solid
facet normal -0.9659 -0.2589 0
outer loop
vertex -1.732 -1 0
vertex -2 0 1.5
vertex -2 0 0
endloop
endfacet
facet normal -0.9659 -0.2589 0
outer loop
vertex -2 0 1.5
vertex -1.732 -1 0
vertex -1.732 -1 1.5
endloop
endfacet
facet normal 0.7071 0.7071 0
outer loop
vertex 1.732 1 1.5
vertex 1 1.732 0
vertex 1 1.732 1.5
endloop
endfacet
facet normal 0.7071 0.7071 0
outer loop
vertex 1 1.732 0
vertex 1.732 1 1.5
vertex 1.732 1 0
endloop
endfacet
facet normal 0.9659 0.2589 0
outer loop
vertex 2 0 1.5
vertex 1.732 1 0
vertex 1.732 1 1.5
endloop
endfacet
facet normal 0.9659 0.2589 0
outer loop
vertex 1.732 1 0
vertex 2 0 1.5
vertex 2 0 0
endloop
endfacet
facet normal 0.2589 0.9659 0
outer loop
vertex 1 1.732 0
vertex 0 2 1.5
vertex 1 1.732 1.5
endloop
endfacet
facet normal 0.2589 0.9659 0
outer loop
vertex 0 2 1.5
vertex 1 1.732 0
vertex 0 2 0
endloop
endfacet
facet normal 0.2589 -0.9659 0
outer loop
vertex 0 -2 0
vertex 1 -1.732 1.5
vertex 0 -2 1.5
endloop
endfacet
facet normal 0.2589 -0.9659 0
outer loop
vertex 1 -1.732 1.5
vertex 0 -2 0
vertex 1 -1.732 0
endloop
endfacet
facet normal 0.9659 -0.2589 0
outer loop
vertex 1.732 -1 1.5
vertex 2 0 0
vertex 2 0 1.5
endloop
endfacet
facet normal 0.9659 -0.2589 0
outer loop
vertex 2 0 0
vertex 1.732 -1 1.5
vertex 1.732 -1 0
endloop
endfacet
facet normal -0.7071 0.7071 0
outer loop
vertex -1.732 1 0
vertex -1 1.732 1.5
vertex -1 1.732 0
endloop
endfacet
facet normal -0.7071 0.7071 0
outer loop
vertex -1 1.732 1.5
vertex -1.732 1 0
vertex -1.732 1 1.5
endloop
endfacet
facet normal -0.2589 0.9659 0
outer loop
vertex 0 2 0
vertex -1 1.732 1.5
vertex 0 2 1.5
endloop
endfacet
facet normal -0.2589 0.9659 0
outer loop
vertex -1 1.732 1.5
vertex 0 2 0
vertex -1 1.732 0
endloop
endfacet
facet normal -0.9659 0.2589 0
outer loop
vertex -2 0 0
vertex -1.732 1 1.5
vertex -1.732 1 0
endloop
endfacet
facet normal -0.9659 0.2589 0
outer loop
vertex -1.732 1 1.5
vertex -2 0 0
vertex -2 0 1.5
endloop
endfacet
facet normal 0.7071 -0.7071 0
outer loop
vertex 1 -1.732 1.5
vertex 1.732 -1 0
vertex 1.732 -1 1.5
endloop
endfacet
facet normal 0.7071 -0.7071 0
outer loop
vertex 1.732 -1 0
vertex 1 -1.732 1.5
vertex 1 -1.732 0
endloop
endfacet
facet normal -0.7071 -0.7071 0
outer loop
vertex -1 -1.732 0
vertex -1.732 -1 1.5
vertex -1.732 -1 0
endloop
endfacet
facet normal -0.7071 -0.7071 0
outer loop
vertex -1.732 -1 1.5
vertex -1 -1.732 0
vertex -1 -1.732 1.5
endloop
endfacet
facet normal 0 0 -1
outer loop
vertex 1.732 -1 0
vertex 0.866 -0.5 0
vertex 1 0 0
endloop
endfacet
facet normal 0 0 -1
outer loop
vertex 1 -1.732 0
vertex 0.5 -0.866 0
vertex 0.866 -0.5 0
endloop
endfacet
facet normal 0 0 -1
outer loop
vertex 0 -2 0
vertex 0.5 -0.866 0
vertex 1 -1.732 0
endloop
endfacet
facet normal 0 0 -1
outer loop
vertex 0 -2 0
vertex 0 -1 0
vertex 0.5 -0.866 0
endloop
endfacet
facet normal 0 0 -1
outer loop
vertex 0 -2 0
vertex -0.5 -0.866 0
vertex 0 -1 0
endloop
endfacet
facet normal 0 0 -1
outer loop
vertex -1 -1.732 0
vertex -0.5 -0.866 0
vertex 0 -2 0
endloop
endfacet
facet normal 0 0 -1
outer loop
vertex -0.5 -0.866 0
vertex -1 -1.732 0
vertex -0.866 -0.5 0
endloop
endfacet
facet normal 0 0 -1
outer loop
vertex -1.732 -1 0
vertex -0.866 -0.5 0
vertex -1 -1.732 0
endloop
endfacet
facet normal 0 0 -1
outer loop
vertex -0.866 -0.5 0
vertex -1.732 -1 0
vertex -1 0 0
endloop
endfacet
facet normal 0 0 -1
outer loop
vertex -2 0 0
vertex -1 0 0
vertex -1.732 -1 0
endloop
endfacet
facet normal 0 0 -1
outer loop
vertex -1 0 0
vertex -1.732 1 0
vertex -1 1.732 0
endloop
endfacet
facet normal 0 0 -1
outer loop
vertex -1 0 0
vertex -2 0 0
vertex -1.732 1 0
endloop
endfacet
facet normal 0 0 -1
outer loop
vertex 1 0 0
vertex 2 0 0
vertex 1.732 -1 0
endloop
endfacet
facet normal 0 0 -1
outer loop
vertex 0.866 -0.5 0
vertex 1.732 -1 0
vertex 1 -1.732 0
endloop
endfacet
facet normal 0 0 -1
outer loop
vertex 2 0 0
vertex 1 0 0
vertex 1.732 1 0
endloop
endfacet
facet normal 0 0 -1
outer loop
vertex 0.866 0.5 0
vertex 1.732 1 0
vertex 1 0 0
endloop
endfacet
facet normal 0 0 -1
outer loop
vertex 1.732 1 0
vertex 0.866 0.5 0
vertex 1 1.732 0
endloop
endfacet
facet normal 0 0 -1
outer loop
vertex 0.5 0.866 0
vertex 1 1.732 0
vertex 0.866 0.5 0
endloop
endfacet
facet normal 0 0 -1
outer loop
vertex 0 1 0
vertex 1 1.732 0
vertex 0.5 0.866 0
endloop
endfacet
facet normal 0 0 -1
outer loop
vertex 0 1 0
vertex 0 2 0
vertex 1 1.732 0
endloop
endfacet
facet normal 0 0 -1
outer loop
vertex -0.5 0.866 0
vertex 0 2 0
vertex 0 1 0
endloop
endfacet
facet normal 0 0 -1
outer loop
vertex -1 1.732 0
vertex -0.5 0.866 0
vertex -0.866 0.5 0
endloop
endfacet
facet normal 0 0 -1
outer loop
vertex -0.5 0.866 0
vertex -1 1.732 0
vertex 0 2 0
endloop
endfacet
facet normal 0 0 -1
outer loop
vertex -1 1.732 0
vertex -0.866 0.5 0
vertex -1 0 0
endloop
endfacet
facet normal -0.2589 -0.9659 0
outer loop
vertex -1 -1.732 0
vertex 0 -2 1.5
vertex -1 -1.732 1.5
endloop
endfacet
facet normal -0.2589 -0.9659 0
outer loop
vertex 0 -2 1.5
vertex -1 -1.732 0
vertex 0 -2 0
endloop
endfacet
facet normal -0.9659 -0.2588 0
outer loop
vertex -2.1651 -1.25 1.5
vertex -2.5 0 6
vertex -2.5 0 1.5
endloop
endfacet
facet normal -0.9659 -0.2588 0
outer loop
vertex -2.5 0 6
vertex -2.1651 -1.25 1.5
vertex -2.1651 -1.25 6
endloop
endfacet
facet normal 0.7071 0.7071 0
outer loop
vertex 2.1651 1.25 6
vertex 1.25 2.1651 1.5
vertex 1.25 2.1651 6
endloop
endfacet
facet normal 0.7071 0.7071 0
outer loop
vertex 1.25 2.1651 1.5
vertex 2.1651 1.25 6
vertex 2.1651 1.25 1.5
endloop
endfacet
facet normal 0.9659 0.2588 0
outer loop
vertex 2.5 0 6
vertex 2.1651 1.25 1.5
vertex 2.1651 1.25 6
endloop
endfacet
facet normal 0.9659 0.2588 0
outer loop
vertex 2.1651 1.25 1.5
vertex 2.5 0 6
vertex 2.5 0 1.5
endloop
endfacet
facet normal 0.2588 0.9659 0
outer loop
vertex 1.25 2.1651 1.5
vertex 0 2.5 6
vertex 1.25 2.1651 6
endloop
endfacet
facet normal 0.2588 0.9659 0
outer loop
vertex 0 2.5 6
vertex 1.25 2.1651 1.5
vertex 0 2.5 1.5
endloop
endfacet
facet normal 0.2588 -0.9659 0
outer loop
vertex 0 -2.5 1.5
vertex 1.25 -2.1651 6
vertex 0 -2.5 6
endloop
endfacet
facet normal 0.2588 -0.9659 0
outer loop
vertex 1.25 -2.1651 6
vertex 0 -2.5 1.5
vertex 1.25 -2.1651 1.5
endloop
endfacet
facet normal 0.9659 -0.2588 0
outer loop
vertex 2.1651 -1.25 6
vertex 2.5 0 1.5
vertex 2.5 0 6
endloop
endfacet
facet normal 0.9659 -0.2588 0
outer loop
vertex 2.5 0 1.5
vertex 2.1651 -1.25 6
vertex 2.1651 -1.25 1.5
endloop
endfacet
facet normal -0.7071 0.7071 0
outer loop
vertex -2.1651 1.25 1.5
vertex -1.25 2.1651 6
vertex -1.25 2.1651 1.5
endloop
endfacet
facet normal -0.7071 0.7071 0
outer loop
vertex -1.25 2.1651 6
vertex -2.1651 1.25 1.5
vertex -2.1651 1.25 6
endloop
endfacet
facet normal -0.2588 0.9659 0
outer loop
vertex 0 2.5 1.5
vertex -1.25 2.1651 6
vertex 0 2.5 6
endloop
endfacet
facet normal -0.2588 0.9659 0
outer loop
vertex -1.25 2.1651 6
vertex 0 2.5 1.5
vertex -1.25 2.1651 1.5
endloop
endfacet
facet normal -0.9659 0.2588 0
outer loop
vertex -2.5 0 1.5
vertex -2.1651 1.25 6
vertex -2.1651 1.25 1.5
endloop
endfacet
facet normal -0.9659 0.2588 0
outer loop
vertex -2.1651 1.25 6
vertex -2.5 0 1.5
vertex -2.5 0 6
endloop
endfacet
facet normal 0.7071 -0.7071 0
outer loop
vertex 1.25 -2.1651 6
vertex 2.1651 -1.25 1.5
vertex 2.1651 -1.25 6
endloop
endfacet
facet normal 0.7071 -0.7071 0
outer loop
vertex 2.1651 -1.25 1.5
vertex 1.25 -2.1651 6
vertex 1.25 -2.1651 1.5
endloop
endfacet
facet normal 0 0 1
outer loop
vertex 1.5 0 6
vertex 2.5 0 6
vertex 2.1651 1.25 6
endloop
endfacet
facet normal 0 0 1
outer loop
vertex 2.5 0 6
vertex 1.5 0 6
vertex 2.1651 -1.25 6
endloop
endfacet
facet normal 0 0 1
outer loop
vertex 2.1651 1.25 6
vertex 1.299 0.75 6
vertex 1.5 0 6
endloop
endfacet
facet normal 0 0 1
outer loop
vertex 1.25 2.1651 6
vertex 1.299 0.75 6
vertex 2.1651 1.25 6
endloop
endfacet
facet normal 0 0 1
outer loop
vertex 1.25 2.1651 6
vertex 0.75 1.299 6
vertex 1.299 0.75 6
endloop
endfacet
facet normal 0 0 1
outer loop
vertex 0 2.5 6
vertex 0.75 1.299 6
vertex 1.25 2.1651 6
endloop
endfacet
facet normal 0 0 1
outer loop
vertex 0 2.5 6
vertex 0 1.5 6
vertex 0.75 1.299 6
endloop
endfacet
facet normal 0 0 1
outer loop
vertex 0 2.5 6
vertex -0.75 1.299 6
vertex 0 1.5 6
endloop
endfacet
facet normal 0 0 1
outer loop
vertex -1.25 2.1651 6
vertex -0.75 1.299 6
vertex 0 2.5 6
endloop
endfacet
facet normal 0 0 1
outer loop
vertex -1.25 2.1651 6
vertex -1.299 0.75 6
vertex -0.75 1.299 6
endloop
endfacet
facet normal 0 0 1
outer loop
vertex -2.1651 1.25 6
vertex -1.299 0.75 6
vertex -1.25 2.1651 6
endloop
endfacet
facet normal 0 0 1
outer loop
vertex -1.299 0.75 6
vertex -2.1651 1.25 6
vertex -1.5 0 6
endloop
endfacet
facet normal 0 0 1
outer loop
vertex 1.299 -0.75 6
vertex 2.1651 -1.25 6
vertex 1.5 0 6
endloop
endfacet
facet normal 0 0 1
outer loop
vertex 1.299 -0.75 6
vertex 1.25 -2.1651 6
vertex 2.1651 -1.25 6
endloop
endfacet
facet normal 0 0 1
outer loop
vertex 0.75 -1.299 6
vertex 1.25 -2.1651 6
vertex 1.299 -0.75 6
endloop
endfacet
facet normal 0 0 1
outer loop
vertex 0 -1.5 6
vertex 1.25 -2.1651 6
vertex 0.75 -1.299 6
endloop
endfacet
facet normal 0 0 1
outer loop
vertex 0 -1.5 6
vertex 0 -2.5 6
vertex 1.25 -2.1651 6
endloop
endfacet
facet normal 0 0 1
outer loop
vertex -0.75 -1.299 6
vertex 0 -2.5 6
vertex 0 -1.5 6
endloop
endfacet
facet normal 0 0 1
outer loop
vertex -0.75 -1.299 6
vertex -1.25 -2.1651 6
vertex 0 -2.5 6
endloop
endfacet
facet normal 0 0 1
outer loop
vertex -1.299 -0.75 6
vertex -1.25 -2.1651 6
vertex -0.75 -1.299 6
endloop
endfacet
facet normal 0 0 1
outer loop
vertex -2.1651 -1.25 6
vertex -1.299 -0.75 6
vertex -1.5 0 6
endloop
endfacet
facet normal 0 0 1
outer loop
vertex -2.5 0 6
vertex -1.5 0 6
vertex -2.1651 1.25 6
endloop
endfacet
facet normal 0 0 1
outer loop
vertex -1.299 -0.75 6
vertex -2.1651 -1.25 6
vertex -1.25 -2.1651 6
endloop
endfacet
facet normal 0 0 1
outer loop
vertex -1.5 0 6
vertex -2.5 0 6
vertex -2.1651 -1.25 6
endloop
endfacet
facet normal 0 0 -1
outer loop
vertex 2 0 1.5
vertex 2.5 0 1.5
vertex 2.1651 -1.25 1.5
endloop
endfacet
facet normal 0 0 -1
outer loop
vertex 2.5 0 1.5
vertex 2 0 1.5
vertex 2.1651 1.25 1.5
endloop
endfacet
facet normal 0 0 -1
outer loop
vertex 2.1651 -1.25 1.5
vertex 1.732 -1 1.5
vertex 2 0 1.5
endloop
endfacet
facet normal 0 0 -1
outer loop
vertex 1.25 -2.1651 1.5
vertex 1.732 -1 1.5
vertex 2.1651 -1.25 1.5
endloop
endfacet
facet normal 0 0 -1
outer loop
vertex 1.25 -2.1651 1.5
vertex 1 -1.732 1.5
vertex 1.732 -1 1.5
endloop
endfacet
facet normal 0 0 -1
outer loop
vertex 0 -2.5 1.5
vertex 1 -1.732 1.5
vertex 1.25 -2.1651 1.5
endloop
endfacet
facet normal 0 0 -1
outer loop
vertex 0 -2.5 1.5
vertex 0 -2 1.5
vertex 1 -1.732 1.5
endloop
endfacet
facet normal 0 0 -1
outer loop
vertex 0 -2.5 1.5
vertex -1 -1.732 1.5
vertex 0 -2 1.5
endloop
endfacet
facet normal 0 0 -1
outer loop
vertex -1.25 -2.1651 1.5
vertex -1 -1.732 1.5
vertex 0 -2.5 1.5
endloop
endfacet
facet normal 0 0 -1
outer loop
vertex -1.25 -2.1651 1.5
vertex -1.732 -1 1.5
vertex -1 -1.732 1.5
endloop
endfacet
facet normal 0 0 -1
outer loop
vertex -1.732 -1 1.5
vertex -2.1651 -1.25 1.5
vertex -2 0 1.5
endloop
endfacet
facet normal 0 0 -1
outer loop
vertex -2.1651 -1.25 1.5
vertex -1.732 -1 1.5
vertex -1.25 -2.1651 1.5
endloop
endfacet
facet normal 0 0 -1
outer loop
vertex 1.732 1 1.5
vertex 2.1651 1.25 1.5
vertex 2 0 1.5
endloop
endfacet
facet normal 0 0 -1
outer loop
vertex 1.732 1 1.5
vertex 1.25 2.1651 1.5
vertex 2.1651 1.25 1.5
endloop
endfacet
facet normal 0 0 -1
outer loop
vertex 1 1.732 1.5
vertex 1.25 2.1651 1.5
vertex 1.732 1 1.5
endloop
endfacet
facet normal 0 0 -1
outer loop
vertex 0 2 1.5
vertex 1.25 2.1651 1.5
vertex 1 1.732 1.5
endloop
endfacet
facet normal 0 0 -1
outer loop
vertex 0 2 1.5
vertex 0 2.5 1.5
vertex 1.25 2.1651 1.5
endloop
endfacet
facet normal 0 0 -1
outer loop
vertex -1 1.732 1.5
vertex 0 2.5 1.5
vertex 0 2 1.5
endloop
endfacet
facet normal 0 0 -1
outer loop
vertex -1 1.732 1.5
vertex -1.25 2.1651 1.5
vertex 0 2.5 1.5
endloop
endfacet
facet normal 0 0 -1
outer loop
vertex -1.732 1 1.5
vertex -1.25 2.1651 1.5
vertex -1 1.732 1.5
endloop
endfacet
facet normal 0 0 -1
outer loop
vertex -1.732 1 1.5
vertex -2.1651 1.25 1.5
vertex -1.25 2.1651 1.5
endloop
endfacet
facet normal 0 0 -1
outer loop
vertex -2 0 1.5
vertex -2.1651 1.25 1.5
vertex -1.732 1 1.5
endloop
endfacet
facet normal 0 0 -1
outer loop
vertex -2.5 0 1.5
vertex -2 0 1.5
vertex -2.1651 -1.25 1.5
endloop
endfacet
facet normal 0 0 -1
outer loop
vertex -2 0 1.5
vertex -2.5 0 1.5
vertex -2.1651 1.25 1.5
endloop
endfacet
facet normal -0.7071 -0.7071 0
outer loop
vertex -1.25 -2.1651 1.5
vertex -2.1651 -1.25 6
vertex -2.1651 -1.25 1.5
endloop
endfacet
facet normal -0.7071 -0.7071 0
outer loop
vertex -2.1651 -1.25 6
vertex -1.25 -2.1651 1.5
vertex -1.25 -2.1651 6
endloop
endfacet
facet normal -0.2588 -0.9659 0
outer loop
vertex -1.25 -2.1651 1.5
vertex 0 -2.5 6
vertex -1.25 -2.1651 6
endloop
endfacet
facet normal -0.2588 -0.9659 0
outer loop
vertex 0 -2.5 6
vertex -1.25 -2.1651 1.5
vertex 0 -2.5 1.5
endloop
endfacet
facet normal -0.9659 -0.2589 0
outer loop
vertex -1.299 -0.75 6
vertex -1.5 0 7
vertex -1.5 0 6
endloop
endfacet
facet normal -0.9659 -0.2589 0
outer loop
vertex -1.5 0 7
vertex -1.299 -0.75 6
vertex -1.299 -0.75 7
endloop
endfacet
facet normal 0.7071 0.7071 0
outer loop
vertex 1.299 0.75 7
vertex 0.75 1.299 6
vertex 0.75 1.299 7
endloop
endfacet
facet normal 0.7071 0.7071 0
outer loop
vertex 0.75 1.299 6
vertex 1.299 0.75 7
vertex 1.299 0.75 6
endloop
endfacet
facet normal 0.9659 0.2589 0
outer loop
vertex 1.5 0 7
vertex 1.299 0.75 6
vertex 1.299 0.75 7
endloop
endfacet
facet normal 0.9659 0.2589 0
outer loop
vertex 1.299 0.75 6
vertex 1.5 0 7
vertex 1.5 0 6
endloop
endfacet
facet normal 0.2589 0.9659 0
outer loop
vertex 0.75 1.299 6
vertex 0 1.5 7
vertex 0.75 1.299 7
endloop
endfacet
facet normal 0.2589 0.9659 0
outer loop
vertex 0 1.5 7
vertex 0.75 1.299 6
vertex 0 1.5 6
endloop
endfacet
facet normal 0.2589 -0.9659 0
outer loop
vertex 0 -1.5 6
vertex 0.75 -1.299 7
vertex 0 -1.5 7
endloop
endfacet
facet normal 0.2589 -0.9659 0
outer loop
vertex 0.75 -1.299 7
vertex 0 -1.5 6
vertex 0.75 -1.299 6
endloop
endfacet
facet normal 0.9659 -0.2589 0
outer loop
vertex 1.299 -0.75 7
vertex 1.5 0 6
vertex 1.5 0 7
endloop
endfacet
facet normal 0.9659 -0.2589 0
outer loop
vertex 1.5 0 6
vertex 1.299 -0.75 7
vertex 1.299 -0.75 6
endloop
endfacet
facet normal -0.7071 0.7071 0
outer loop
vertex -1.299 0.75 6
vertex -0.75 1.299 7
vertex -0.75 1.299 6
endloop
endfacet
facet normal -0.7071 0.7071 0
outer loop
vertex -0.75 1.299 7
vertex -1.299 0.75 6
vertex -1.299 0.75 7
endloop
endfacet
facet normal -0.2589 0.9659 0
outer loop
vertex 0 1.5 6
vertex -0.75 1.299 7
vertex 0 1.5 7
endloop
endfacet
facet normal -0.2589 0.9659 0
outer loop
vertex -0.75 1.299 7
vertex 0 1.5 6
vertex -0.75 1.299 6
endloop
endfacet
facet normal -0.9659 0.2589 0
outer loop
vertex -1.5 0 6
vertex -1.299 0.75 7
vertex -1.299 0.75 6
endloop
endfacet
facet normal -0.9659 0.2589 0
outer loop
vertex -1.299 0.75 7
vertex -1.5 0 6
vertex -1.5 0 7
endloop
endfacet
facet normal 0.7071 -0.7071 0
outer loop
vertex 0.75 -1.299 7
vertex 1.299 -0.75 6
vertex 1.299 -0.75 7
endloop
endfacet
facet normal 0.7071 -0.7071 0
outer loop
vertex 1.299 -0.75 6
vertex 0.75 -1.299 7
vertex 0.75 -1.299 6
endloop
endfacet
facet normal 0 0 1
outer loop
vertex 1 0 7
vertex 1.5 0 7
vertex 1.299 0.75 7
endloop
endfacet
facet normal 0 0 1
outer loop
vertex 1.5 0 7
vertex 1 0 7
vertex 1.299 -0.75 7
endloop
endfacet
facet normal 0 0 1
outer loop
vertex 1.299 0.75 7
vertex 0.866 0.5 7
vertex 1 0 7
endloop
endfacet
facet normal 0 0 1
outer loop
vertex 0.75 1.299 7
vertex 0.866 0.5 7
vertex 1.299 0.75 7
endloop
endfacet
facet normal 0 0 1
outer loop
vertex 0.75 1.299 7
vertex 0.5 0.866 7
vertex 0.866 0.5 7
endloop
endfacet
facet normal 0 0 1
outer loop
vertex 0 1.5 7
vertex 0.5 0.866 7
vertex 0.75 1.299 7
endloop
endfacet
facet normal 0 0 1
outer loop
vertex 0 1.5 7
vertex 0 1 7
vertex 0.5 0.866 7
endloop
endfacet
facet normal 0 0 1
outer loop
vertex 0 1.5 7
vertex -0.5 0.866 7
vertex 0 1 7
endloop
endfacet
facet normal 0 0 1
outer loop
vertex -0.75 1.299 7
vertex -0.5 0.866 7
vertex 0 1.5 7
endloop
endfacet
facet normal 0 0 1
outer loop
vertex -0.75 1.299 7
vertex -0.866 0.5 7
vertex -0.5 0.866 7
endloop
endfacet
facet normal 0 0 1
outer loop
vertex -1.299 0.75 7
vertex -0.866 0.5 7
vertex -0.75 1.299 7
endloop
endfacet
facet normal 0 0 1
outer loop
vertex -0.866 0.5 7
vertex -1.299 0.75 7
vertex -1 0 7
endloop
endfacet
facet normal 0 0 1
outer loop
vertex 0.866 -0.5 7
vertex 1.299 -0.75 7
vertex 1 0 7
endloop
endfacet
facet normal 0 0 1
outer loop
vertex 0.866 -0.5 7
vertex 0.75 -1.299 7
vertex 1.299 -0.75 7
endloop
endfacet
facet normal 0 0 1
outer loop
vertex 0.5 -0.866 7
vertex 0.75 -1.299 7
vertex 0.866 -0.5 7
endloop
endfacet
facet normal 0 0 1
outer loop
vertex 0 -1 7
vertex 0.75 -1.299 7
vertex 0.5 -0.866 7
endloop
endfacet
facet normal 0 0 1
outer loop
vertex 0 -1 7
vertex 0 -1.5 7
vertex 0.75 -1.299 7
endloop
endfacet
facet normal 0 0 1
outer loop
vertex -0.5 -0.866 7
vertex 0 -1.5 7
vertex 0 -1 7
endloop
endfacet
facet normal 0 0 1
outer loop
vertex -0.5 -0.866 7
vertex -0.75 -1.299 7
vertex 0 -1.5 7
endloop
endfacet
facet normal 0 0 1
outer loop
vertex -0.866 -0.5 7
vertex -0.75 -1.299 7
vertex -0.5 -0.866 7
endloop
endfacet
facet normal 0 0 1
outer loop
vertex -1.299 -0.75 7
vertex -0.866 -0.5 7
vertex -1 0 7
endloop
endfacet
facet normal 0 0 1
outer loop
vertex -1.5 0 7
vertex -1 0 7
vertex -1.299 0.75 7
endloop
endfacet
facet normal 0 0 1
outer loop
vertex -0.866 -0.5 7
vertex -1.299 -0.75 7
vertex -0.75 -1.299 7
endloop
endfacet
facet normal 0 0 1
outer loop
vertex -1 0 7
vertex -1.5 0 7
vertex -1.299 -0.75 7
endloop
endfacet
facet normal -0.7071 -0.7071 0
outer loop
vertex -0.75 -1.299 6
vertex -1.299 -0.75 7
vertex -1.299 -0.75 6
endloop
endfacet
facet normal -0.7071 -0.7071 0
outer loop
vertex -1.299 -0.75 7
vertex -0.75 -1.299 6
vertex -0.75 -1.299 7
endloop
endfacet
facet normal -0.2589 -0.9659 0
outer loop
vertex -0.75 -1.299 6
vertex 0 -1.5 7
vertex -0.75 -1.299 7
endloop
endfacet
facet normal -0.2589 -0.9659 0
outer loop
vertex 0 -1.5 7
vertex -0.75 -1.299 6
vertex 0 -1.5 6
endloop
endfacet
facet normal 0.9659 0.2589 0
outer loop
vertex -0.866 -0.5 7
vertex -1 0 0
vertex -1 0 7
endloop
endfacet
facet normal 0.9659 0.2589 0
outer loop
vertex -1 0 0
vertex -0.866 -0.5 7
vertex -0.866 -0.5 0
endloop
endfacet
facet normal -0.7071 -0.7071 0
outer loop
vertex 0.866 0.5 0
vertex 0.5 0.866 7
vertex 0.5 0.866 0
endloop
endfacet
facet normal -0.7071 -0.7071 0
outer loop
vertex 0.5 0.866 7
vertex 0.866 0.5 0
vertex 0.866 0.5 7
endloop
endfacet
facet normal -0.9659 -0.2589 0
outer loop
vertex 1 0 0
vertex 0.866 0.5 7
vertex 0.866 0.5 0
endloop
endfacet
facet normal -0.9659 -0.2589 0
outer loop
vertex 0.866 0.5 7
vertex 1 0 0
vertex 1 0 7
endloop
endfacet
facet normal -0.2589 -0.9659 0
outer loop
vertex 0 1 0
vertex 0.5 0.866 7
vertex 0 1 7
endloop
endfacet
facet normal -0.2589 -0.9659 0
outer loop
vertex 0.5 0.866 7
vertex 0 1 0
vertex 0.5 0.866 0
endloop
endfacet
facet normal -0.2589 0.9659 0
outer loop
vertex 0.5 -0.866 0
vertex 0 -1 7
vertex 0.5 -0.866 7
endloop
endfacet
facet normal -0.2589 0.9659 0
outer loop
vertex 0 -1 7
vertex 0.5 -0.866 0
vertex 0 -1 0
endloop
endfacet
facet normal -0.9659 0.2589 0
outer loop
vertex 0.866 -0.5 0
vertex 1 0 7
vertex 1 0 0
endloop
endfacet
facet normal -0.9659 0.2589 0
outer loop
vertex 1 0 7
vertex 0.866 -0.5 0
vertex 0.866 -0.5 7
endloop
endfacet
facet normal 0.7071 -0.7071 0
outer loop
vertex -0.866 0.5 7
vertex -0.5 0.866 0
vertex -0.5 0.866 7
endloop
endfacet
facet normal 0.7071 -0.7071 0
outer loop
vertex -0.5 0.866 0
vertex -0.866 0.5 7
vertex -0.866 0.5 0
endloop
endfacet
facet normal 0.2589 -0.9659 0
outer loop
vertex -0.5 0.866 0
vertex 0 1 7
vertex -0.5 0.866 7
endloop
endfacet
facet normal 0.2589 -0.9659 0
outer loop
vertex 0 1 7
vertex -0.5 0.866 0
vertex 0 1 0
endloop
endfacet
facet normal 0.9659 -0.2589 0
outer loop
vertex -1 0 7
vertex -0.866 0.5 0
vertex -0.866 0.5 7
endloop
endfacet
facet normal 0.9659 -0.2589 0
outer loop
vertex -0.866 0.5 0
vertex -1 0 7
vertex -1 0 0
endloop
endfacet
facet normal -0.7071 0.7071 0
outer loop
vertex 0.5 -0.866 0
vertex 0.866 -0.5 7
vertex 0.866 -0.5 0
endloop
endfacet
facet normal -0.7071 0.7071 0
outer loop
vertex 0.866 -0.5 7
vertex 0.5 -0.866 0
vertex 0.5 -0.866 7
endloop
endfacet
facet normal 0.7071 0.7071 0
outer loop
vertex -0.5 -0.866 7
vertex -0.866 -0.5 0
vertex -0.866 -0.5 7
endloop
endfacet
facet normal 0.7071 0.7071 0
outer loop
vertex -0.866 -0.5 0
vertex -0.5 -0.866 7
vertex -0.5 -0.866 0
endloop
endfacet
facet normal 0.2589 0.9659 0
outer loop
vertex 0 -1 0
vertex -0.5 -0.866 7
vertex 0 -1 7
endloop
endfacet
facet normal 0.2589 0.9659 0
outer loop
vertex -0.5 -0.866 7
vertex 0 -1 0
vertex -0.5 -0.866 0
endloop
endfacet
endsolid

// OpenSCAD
// brick round 1x1 w hole

// external vars #########################

// part ##################################

module brick_round_1x1_w_hole() {
  $fn = 12;
  difference() {
    union() {
      cylinder(h=2,d=4);
      translate([0,0,1.5]) cylinder(h=4.5,d=5);
      translate([0,0,5.5]) cylinder(h=1.5,d=3);
    }
    translate([0,0,-0.5]) cylinder(h=8,d=2);
  }
}

brick_round_1x1_w_hole();
